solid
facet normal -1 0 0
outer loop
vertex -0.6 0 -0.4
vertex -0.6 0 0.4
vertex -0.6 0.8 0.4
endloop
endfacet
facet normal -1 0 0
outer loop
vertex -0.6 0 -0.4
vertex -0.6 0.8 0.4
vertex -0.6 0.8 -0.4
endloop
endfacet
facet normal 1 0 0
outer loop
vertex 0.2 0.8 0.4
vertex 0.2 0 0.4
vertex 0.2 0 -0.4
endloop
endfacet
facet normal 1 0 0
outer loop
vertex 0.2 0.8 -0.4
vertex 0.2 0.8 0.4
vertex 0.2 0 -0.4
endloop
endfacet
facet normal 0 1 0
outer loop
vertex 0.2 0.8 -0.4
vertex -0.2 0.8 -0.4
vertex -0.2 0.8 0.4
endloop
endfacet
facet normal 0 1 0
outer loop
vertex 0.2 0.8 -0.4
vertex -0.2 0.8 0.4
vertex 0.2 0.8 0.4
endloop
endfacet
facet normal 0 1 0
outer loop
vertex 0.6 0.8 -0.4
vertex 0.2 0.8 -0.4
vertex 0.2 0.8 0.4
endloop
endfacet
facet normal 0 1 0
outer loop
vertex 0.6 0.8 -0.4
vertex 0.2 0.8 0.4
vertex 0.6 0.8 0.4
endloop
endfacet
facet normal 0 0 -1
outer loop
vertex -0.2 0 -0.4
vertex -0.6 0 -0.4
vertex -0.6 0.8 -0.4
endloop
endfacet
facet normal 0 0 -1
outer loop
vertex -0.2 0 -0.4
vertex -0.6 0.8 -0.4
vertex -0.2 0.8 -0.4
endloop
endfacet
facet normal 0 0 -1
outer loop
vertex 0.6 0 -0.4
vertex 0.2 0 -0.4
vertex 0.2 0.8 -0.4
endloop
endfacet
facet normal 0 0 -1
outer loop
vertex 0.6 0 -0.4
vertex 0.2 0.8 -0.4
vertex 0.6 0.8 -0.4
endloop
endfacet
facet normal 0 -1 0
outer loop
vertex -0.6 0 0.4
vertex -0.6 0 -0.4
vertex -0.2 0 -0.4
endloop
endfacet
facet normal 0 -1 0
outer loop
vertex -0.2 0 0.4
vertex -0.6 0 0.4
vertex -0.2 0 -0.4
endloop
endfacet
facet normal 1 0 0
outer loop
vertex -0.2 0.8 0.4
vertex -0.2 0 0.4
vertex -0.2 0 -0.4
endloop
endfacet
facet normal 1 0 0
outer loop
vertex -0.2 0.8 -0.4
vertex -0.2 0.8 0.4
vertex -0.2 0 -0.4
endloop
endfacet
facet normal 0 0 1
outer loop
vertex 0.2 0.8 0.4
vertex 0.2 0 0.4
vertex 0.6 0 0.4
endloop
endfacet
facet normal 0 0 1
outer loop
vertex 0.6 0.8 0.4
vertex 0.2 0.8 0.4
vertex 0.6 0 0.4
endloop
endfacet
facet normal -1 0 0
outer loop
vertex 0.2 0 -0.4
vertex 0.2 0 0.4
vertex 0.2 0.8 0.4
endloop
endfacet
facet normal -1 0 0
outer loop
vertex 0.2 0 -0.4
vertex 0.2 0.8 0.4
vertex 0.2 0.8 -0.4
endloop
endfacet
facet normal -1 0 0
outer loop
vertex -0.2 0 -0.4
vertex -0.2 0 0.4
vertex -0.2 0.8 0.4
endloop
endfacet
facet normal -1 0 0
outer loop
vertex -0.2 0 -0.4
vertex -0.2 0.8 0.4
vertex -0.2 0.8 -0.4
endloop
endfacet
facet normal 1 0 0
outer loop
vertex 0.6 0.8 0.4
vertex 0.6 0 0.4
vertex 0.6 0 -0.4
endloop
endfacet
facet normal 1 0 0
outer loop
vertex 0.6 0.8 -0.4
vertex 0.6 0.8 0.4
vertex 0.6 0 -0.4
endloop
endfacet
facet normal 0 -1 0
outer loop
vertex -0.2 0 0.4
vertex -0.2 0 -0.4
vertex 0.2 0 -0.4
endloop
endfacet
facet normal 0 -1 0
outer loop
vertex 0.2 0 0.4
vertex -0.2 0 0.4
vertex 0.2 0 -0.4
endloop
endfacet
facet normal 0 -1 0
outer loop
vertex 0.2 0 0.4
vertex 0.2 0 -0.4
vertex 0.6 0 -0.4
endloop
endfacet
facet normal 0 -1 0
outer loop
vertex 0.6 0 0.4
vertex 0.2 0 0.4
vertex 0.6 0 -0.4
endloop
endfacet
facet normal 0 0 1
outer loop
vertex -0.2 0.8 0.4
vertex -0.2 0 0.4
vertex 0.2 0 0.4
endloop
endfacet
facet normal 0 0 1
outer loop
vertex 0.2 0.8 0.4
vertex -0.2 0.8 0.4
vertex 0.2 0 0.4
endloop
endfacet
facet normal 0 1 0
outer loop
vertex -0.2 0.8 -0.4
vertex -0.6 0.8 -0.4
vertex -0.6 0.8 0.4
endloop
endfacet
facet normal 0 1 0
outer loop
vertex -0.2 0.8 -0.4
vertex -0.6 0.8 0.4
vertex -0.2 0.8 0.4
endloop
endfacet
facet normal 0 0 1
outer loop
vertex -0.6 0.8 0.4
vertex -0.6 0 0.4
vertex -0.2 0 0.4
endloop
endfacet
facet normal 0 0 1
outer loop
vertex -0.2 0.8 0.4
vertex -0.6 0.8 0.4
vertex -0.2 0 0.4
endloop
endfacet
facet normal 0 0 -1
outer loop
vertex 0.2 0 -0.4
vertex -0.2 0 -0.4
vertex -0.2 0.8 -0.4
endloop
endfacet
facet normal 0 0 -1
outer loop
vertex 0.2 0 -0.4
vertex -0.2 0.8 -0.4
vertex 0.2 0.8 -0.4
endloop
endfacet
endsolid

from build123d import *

# Parameters (mm, degrees)
SKETCH1_W             = 0.4
SKETCH1_H             = 0.8
BOSS_EXTRUDE1_DEPTH   = 0.8
SKETCH2_W             = 0.4
SKETCH2_H             = 0.8
BOSS_EXTRUDE2_DEPTH   = 0.8
BOSS_EXTRUDE2_2_DEPTH = 0.8


with BuildPart() as part:
    # Sketch1 → Boss-Extrude1 (new body)
    with BuildSketch(Plane(origin=(0, 0, 0), x_dir=(1, 0, 0), z_dir=(0, 1, 0))):
        Rectangle(SKETCH1_W, SKETCH1_H)
    extrude(amount=BOSS_EXTRUDE1_DEPTH)


with BuildPart() as body_2:
    # Sketch2 → Boss-Extrude2 (new body)
    with BuildSketch(Plane(origin=(0, 0, 0), x_dir=(1, 0, 0), z_dir=(0, 1, 0))):
        with Locations((-0.4, 0)):
            Rectangle(SKETCH2_W, SKETCH2_H)
    extrude(amount=BOSS_EXTRUDE2_DEPTH)


with BuildPart() as body_3:
    # Sketch2 → Boss-Extrude2 2 (new body)
    with BuildSketch(Plane(origin=(0, 0, 0), x_dir=(1, 0, 0), z_dir=(0, 1, 0))):
        with Locations((0.4, 0)):
            Rectangle(SKETCH2_W, SKETCH2_H)
    extrude(amount=BOSS_EXTRUDE2_2_DEPTH)


solid = Compound([part.part, body_2.part, body_3.part])
